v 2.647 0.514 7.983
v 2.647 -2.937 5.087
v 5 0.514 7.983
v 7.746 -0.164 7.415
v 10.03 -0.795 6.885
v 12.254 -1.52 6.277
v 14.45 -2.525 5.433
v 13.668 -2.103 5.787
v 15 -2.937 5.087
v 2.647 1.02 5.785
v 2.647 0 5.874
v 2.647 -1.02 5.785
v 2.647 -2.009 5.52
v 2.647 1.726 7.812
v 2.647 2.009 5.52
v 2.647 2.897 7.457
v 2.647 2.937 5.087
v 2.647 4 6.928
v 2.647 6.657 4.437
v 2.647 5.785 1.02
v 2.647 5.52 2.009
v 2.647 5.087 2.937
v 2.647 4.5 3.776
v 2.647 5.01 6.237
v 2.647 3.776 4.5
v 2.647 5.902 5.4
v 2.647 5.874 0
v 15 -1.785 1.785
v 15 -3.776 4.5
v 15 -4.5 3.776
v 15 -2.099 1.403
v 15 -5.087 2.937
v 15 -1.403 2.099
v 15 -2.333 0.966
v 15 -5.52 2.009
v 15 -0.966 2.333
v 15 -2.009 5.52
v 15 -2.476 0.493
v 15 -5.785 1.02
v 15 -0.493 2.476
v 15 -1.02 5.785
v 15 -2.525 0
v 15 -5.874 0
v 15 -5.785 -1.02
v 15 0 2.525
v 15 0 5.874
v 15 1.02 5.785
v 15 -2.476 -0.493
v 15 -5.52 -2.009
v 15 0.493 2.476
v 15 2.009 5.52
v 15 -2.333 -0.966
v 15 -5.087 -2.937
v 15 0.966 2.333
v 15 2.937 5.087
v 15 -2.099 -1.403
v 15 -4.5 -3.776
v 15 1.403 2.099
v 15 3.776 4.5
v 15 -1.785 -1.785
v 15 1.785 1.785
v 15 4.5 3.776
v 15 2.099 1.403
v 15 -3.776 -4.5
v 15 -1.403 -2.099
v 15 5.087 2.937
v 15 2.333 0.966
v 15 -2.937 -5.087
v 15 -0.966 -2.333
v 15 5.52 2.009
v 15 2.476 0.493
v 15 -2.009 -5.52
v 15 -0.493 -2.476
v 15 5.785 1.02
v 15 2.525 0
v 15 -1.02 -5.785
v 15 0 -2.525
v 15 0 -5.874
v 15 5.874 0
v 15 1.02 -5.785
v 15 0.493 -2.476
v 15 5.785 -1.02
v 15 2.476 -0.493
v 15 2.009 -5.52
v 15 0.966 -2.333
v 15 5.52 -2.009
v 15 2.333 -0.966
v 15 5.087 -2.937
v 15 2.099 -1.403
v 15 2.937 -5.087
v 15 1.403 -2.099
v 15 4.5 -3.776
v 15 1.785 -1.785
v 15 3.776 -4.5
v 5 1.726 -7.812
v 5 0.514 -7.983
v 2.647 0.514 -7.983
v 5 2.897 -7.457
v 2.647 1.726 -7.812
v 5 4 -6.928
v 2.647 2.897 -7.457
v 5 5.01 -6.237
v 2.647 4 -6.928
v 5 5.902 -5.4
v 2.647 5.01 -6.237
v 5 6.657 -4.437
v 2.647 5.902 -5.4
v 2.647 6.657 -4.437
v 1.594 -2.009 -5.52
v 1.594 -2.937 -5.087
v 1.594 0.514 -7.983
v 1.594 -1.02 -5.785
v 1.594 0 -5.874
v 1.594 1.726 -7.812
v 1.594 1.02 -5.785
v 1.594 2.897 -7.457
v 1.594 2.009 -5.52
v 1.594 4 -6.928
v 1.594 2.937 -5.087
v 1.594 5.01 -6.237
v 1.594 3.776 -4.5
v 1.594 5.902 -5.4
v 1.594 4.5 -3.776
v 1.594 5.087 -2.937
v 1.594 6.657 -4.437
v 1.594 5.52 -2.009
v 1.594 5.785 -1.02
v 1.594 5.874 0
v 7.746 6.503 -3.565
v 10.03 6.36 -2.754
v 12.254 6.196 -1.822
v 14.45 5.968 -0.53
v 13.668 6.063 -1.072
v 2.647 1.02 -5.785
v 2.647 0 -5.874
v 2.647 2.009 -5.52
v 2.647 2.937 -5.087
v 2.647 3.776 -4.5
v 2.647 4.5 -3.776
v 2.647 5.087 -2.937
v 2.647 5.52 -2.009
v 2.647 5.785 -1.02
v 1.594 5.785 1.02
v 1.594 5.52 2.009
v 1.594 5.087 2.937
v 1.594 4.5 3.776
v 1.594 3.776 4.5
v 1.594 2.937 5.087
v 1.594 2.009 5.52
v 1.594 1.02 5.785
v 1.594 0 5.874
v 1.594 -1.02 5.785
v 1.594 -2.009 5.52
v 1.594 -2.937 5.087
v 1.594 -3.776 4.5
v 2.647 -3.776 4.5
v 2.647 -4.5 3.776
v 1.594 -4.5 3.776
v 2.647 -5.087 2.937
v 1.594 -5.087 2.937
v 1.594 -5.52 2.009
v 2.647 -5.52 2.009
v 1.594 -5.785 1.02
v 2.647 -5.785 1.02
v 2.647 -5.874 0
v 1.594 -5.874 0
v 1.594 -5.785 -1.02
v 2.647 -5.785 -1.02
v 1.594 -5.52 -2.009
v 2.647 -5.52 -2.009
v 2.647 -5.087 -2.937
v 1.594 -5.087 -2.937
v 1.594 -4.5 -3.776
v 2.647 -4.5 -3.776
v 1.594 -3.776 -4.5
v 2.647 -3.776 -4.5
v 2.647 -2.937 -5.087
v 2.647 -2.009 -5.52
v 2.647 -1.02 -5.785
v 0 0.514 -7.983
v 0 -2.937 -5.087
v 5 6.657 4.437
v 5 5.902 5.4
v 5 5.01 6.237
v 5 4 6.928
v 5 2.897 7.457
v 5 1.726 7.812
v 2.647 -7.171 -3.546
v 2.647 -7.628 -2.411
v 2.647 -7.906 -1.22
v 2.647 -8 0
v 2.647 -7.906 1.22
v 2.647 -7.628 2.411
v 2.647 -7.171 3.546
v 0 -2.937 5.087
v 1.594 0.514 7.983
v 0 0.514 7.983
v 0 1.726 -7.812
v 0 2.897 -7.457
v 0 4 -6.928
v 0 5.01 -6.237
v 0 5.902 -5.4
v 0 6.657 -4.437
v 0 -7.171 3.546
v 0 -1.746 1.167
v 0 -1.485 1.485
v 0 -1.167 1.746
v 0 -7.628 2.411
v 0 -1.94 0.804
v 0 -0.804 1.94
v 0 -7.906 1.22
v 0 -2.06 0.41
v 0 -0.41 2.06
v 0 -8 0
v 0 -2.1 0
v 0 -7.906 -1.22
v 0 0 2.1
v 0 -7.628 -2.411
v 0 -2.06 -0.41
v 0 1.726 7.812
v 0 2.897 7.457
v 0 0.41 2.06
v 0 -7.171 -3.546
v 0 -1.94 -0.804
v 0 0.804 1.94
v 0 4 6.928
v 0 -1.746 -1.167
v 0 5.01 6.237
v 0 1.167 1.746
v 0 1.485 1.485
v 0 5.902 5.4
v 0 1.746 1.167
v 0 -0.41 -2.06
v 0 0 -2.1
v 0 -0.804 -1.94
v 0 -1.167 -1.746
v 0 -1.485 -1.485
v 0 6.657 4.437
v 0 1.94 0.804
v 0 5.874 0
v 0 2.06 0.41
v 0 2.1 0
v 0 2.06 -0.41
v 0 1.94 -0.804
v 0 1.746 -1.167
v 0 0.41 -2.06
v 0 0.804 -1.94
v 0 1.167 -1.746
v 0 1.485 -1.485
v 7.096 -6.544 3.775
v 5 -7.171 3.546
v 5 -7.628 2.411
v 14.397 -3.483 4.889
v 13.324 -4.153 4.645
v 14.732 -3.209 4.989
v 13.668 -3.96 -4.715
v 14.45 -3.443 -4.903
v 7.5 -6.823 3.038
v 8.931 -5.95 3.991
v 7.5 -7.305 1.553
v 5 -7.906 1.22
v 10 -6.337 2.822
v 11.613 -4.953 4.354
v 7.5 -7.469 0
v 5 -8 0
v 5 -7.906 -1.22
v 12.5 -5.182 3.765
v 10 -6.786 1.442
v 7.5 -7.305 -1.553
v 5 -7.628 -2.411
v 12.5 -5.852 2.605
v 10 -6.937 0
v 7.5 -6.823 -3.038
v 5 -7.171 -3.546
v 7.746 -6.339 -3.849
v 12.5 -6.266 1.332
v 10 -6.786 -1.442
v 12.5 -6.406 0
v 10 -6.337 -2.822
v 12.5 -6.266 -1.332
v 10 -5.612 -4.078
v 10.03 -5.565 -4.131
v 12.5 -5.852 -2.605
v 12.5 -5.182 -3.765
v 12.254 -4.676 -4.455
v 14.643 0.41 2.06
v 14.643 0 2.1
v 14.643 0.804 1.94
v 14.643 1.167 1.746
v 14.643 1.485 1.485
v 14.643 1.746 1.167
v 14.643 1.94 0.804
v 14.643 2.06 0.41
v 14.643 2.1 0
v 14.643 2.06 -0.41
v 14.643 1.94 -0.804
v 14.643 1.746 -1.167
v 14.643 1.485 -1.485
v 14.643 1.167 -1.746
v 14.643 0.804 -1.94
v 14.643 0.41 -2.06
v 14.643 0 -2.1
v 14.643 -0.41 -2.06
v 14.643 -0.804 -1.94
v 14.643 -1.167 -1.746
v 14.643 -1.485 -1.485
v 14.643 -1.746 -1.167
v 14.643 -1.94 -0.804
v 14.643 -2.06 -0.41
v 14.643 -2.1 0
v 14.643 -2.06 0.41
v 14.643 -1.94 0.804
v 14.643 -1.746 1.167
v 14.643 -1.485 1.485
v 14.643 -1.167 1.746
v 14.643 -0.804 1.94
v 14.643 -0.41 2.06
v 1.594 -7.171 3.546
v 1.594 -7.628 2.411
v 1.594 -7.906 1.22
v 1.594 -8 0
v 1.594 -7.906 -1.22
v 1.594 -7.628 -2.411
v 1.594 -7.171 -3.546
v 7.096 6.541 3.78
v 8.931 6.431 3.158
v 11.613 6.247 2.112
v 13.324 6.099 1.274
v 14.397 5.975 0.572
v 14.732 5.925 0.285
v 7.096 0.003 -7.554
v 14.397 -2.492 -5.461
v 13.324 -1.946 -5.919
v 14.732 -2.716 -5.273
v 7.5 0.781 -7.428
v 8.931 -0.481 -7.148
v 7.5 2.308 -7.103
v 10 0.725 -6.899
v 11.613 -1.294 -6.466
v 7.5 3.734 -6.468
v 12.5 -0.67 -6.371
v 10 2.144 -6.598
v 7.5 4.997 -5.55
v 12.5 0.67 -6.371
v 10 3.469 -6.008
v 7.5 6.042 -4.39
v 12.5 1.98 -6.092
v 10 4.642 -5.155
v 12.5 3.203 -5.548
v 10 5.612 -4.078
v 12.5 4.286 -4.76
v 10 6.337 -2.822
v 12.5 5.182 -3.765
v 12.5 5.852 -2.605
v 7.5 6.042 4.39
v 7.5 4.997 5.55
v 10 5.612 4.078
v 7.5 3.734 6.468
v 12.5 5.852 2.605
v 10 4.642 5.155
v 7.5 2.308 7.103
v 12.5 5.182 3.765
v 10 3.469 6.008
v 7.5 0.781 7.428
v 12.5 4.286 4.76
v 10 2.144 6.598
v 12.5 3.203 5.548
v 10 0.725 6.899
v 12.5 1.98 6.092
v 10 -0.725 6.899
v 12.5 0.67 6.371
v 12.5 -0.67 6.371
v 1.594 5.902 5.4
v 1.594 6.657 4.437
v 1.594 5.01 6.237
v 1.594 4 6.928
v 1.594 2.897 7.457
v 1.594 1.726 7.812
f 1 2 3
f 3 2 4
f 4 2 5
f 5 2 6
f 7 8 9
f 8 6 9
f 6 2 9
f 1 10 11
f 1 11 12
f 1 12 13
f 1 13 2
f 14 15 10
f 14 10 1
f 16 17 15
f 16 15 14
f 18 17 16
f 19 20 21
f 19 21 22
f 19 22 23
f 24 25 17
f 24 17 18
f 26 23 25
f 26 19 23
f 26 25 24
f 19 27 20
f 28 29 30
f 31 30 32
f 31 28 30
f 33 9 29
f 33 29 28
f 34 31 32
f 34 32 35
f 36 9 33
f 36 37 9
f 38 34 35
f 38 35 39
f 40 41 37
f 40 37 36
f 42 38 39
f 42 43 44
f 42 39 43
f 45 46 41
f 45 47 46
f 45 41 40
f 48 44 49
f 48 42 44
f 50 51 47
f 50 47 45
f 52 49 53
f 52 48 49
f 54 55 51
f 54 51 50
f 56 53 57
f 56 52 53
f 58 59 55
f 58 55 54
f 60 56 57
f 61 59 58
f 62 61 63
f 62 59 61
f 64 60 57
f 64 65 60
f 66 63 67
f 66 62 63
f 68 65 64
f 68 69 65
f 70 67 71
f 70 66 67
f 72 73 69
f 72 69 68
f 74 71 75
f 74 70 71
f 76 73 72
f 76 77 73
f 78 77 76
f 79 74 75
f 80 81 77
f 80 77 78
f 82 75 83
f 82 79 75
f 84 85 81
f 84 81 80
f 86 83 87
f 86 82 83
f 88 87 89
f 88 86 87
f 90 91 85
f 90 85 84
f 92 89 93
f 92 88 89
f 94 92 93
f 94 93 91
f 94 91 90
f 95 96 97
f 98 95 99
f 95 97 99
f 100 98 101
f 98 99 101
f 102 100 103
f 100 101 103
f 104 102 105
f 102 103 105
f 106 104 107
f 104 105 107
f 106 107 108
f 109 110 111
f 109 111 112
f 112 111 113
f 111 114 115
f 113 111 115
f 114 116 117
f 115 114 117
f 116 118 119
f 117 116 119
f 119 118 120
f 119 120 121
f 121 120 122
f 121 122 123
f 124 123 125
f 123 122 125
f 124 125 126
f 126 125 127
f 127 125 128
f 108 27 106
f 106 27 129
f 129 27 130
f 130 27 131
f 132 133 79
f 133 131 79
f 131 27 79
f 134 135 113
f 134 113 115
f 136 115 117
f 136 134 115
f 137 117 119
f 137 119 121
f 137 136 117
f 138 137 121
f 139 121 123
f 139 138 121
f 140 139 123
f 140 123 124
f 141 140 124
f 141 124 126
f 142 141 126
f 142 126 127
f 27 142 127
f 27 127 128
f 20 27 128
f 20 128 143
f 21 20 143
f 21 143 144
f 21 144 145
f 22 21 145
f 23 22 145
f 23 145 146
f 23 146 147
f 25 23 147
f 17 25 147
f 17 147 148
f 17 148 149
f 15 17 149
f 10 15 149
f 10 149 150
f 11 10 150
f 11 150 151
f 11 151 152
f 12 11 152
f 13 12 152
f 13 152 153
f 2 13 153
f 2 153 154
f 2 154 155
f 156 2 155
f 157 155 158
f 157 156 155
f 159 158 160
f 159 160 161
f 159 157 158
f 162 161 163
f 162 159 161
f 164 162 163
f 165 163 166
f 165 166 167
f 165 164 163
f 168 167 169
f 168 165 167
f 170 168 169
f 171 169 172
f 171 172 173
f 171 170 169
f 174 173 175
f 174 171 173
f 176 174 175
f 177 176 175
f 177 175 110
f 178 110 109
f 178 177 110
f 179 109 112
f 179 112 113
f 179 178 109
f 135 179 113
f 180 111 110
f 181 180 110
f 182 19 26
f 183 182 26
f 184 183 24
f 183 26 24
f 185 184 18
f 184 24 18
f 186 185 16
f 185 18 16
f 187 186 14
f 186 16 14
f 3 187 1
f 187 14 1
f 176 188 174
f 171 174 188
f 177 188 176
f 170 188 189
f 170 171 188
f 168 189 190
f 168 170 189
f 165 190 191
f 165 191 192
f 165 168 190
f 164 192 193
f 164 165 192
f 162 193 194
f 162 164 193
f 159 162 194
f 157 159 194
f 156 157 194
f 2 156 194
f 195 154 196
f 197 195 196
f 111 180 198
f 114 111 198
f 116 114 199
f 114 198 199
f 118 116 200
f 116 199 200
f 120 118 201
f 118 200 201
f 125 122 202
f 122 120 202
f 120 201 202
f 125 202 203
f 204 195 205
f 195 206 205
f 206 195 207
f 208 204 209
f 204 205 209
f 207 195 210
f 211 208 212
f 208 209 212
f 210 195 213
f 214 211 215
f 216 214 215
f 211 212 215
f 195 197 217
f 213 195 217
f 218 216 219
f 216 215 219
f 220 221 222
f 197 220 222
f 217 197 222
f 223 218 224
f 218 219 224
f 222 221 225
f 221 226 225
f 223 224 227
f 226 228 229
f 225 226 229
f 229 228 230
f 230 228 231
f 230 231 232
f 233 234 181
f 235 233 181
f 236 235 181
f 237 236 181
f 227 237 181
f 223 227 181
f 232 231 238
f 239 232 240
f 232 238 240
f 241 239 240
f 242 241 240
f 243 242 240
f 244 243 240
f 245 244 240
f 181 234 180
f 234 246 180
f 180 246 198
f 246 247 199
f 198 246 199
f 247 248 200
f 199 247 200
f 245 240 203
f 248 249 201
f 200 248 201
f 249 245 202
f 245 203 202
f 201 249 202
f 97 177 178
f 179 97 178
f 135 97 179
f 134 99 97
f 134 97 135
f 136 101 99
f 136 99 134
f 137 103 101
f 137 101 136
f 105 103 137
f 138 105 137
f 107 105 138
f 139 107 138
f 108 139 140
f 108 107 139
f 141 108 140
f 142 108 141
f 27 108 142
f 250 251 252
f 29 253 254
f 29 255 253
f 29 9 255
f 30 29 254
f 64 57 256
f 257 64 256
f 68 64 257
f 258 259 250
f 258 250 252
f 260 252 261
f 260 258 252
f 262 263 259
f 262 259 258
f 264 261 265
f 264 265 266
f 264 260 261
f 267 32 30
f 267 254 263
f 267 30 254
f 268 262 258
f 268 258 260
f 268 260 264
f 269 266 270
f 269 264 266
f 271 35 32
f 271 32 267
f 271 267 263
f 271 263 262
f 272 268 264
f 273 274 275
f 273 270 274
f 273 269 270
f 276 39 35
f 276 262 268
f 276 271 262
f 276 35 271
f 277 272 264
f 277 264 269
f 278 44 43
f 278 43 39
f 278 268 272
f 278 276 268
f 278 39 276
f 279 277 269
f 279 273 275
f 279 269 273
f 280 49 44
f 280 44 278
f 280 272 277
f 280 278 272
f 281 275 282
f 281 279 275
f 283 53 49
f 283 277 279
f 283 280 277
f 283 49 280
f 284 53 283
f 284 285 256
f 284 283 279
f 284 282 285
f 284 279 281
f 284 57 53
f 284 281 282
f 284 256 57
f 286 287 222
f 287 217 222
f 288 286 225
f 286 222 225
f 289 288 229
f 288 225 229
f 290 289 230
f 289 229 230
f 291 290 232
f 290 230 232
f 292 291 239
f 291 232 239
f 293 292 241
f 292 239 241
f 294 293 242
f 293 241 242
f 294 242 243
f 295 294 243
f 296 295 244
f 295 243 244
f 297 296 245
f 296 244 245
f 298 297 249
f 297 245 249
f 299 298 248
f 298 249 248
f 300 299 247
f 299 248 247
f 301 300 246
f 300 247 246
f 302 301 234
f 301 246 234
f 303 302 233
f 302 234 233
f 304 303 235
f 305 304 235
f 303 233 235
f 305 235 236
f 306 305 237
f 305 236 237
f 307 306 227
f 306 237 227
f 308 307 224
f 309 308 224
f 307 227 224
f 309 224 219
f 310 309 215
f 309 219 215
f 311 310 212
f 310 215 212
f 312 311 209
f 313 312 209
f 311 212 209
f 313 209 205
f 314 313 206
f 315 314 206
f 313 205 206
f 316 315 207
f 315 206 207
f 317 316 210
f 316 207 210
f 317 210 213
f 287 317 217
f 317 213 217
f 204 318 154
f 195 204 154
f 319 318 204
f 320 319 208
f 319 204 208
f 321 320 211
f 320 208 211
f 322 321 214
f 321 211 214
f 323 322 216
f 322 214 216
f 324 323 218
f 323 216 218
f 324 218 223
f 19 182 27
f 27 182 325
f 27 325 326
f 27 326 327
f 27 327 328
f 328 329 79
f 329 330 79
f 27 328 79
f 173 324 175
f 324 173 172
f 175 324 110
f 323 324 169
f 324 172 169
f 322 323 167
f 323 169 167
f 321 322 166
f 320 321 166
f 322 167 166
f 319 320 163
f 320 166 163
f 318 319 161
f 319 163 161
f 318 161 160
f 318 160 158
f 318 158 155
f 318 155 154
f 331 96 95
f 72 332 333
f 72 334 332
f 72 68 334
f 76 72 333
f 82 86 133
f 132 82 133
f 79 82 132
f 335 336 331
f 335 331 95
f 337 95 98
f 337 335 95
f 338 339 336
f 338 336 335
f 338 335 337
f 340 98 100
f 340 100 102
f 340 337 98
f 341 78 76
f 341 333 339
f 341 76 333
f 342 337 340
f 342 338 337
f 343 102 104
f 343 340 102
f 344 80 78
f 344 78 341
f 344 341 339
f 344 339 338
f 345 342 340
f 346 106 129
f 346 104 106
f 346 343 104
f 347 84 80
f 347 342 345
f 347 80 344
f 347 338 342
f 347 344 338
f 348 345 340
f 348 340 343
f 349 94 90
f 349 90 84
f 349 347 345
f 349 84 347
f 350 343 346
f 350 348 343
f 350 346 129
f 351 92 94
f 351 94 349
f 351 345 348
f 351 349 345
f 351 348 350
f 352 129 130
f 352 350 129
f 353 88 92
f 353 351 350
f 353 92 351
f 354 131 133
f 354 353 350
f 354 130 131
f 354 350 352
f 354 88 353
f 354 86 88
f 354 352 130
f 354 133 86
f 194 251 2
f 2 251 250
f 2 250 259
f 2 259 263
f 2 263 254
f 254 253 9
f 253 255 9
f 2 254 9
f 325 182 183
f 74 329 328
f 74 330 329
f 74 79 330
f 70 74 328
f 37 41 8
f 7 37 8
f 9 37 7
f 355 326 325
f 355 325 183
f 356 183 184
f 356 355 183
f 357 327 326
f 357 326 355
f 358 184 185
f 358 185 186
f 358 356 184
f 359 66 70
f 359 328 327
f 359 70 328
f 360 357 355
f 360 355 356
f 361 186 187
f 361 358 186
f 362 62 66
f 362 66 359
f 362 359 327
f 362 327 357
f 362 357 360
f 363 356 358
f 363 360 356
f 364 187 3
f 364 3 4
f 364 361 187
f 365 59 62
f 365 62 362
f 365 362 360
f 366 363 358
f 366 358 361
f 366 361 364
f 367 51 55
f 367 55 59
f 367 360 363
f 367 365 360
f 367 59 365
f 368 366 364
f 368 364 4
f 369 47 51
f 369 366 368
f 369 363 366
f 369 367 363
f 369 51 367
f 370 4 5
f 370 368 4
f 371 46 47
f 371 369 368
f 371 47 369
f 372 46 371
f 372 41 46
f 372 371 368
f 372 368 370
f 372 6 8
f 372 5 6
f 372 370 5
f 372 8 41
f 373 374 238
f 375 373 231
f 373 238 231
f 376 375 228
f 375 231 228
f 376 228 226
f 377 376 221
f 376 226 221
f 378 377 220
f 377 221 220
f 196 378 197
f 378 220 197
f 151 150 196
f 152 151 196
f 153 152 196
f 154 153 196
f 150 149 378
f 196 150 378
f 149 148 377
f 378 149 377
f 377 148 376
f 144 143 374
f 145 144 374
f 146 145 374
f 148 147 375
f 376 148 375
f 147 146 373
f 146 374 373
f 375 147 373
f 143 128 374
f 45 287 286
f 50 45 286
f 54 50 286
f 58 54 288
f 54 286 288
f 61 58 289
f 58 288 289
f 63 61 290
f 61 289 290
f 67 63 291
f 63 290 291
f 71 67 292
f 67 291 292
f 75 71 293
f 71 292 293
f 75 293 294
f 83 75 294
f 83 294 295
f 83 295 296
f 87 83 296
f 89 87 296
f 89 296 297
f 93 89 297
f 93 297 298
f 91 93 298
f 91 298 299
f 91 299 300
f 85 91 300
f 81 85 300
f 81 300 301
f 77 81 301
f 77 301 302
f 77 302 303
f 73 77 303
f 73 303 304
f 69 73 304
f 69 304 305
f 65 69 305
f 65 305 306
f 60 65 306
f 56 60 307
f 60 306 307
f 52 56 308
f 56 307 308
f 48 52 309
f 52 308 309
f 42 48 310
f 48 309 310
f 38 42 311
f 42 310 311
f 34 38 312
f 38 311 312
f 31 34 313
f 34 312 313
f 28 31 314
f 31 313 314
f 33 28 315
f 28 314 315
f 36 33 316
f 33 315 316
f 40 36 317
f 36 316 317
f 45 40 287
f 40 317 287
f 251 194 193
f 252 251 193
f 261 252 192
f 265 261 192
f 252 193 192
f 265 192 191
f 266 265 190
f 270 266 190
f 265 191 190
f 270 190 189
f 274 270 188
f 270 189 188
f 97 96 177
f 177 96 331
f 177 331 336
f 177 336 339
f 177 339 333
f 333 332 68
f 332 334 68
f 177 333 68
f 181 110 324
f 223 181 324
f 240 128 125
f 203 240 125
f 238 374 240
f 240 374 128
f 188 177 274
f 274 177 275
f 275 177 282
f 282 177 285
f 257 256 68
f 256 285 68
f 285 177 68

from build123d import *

# Parameters (mm, degrees)
SKETCH1_R                   = 8
BOSS_EXTRUDE1_DEPTH         = 5
SKETCH2_R                   = 8
BOSS_EXTRUDE2_DEPTH         = 10
BOSS_EXTRUDE2_TAPER         = 12
CUT_EXTRUDE5_DEPTH          = 19.788294313
CIRPATTERN1_COUNT           = 3
M5_TAPPED_HOLE1_D           = 4.2
M5_TAPPED_HOLE1_CSINK_D     = 5.05
M5_TAPPED_HOLE1_CSINK_ANGLE = 100
SKETCH6_W                   = 1.053506638
SKETCH6_H                   = 3.031369011


with BuildPart() as part:
    # Sketch1 → Boss-Extrude1 (new body)
    with BuildSketch(Plane(origin=(0, 0, 0), x_dir=(0, 0, -1), z_dir=(1, 0, 0))):
        Circle(SKETCH1_R)
    extrude(amount=BOSS_EXTRUDE1_DEPTH)

    # Sketch2 → Boss-Extrude2 (add)
    with BuildSketch(Plane(origin=(5, 0, 0), x_dir=(0, 0, -1), z_dir=(1, 0, 0))):
        Circle(SKETCH2_R)
    extrude(amount=BOSS_EXTRUDE2_DEPTH, taper=BOSS_EXTRUDE2_TAPER)

    # Sketch3 → Cut-Extrude5 (cut, through all)
    with BuildSketch(Plane(origin=(15, 0, 0), x_dir=(0, 0, -1), z_dir=(1, 0, 0))):
        with BuildLine():
            Line((0, 5.874434383), (11.406864113, 7.885772292))
            ThreePointArc((11.406864113, 7.885772292), (0.570239316, 16.679095968), (-10.070915149, 7.650208444))
            Line((-10.070915149, 7.650208444), (0, 5.874434383))
        make_face()
    cut_extrude5 = extrude(amount=-CUT_EXTRUDE5_DEPTH, mode=Mode.SUBTRACT)

    # CirPattern1: Cut-Extrude5 ×3 about axis
    cirpattern1_axis = Axis((0, 0, 0), (1, 0, 0))
    for i in range(1, CIRPATTERN1_COUNT):
        add(cut_extrude5.rotate(cirpattern1_axis, i * 360 / CIRPATTERN1_COUNT), mode=Mode.SUBTRACT)

    # M5 Tapped Hole1 (through all)
    with Locations(Plane(origin=(15, 0, 0), x_dir=(0, 0, -1), z_dir=(1, 0, 0))):
        with Locations((0, 0)):
            CounterSinkHole(M5_TAPPED_HOLE1_D / 2, M5_TAPPED_HOLE1_CSINK_D / 2, counter_sink_angle=M5_TAPPED_HOLE1_CSINK_ANGLE)

    # Sketch6 → Cut-Revolve2 (revolve, cut)
    with BuildSketch(Plane.XY, mode=Mode.PRIVATE) as cut_revolve2_sk:
        with Locations((2.120528078, 7.390118889)):
            Rectangle(SKETCH6_W, SKETCH6_H)
    revolve(cut_revolve2_sk.sketch.rotate(Axis((0, 0, 0), (1, 0, 0)), 270), axis=Axis((0, 0, 0), (1, 0, 0)), mode=Mode.SUBTRACT)


solid = part.part
